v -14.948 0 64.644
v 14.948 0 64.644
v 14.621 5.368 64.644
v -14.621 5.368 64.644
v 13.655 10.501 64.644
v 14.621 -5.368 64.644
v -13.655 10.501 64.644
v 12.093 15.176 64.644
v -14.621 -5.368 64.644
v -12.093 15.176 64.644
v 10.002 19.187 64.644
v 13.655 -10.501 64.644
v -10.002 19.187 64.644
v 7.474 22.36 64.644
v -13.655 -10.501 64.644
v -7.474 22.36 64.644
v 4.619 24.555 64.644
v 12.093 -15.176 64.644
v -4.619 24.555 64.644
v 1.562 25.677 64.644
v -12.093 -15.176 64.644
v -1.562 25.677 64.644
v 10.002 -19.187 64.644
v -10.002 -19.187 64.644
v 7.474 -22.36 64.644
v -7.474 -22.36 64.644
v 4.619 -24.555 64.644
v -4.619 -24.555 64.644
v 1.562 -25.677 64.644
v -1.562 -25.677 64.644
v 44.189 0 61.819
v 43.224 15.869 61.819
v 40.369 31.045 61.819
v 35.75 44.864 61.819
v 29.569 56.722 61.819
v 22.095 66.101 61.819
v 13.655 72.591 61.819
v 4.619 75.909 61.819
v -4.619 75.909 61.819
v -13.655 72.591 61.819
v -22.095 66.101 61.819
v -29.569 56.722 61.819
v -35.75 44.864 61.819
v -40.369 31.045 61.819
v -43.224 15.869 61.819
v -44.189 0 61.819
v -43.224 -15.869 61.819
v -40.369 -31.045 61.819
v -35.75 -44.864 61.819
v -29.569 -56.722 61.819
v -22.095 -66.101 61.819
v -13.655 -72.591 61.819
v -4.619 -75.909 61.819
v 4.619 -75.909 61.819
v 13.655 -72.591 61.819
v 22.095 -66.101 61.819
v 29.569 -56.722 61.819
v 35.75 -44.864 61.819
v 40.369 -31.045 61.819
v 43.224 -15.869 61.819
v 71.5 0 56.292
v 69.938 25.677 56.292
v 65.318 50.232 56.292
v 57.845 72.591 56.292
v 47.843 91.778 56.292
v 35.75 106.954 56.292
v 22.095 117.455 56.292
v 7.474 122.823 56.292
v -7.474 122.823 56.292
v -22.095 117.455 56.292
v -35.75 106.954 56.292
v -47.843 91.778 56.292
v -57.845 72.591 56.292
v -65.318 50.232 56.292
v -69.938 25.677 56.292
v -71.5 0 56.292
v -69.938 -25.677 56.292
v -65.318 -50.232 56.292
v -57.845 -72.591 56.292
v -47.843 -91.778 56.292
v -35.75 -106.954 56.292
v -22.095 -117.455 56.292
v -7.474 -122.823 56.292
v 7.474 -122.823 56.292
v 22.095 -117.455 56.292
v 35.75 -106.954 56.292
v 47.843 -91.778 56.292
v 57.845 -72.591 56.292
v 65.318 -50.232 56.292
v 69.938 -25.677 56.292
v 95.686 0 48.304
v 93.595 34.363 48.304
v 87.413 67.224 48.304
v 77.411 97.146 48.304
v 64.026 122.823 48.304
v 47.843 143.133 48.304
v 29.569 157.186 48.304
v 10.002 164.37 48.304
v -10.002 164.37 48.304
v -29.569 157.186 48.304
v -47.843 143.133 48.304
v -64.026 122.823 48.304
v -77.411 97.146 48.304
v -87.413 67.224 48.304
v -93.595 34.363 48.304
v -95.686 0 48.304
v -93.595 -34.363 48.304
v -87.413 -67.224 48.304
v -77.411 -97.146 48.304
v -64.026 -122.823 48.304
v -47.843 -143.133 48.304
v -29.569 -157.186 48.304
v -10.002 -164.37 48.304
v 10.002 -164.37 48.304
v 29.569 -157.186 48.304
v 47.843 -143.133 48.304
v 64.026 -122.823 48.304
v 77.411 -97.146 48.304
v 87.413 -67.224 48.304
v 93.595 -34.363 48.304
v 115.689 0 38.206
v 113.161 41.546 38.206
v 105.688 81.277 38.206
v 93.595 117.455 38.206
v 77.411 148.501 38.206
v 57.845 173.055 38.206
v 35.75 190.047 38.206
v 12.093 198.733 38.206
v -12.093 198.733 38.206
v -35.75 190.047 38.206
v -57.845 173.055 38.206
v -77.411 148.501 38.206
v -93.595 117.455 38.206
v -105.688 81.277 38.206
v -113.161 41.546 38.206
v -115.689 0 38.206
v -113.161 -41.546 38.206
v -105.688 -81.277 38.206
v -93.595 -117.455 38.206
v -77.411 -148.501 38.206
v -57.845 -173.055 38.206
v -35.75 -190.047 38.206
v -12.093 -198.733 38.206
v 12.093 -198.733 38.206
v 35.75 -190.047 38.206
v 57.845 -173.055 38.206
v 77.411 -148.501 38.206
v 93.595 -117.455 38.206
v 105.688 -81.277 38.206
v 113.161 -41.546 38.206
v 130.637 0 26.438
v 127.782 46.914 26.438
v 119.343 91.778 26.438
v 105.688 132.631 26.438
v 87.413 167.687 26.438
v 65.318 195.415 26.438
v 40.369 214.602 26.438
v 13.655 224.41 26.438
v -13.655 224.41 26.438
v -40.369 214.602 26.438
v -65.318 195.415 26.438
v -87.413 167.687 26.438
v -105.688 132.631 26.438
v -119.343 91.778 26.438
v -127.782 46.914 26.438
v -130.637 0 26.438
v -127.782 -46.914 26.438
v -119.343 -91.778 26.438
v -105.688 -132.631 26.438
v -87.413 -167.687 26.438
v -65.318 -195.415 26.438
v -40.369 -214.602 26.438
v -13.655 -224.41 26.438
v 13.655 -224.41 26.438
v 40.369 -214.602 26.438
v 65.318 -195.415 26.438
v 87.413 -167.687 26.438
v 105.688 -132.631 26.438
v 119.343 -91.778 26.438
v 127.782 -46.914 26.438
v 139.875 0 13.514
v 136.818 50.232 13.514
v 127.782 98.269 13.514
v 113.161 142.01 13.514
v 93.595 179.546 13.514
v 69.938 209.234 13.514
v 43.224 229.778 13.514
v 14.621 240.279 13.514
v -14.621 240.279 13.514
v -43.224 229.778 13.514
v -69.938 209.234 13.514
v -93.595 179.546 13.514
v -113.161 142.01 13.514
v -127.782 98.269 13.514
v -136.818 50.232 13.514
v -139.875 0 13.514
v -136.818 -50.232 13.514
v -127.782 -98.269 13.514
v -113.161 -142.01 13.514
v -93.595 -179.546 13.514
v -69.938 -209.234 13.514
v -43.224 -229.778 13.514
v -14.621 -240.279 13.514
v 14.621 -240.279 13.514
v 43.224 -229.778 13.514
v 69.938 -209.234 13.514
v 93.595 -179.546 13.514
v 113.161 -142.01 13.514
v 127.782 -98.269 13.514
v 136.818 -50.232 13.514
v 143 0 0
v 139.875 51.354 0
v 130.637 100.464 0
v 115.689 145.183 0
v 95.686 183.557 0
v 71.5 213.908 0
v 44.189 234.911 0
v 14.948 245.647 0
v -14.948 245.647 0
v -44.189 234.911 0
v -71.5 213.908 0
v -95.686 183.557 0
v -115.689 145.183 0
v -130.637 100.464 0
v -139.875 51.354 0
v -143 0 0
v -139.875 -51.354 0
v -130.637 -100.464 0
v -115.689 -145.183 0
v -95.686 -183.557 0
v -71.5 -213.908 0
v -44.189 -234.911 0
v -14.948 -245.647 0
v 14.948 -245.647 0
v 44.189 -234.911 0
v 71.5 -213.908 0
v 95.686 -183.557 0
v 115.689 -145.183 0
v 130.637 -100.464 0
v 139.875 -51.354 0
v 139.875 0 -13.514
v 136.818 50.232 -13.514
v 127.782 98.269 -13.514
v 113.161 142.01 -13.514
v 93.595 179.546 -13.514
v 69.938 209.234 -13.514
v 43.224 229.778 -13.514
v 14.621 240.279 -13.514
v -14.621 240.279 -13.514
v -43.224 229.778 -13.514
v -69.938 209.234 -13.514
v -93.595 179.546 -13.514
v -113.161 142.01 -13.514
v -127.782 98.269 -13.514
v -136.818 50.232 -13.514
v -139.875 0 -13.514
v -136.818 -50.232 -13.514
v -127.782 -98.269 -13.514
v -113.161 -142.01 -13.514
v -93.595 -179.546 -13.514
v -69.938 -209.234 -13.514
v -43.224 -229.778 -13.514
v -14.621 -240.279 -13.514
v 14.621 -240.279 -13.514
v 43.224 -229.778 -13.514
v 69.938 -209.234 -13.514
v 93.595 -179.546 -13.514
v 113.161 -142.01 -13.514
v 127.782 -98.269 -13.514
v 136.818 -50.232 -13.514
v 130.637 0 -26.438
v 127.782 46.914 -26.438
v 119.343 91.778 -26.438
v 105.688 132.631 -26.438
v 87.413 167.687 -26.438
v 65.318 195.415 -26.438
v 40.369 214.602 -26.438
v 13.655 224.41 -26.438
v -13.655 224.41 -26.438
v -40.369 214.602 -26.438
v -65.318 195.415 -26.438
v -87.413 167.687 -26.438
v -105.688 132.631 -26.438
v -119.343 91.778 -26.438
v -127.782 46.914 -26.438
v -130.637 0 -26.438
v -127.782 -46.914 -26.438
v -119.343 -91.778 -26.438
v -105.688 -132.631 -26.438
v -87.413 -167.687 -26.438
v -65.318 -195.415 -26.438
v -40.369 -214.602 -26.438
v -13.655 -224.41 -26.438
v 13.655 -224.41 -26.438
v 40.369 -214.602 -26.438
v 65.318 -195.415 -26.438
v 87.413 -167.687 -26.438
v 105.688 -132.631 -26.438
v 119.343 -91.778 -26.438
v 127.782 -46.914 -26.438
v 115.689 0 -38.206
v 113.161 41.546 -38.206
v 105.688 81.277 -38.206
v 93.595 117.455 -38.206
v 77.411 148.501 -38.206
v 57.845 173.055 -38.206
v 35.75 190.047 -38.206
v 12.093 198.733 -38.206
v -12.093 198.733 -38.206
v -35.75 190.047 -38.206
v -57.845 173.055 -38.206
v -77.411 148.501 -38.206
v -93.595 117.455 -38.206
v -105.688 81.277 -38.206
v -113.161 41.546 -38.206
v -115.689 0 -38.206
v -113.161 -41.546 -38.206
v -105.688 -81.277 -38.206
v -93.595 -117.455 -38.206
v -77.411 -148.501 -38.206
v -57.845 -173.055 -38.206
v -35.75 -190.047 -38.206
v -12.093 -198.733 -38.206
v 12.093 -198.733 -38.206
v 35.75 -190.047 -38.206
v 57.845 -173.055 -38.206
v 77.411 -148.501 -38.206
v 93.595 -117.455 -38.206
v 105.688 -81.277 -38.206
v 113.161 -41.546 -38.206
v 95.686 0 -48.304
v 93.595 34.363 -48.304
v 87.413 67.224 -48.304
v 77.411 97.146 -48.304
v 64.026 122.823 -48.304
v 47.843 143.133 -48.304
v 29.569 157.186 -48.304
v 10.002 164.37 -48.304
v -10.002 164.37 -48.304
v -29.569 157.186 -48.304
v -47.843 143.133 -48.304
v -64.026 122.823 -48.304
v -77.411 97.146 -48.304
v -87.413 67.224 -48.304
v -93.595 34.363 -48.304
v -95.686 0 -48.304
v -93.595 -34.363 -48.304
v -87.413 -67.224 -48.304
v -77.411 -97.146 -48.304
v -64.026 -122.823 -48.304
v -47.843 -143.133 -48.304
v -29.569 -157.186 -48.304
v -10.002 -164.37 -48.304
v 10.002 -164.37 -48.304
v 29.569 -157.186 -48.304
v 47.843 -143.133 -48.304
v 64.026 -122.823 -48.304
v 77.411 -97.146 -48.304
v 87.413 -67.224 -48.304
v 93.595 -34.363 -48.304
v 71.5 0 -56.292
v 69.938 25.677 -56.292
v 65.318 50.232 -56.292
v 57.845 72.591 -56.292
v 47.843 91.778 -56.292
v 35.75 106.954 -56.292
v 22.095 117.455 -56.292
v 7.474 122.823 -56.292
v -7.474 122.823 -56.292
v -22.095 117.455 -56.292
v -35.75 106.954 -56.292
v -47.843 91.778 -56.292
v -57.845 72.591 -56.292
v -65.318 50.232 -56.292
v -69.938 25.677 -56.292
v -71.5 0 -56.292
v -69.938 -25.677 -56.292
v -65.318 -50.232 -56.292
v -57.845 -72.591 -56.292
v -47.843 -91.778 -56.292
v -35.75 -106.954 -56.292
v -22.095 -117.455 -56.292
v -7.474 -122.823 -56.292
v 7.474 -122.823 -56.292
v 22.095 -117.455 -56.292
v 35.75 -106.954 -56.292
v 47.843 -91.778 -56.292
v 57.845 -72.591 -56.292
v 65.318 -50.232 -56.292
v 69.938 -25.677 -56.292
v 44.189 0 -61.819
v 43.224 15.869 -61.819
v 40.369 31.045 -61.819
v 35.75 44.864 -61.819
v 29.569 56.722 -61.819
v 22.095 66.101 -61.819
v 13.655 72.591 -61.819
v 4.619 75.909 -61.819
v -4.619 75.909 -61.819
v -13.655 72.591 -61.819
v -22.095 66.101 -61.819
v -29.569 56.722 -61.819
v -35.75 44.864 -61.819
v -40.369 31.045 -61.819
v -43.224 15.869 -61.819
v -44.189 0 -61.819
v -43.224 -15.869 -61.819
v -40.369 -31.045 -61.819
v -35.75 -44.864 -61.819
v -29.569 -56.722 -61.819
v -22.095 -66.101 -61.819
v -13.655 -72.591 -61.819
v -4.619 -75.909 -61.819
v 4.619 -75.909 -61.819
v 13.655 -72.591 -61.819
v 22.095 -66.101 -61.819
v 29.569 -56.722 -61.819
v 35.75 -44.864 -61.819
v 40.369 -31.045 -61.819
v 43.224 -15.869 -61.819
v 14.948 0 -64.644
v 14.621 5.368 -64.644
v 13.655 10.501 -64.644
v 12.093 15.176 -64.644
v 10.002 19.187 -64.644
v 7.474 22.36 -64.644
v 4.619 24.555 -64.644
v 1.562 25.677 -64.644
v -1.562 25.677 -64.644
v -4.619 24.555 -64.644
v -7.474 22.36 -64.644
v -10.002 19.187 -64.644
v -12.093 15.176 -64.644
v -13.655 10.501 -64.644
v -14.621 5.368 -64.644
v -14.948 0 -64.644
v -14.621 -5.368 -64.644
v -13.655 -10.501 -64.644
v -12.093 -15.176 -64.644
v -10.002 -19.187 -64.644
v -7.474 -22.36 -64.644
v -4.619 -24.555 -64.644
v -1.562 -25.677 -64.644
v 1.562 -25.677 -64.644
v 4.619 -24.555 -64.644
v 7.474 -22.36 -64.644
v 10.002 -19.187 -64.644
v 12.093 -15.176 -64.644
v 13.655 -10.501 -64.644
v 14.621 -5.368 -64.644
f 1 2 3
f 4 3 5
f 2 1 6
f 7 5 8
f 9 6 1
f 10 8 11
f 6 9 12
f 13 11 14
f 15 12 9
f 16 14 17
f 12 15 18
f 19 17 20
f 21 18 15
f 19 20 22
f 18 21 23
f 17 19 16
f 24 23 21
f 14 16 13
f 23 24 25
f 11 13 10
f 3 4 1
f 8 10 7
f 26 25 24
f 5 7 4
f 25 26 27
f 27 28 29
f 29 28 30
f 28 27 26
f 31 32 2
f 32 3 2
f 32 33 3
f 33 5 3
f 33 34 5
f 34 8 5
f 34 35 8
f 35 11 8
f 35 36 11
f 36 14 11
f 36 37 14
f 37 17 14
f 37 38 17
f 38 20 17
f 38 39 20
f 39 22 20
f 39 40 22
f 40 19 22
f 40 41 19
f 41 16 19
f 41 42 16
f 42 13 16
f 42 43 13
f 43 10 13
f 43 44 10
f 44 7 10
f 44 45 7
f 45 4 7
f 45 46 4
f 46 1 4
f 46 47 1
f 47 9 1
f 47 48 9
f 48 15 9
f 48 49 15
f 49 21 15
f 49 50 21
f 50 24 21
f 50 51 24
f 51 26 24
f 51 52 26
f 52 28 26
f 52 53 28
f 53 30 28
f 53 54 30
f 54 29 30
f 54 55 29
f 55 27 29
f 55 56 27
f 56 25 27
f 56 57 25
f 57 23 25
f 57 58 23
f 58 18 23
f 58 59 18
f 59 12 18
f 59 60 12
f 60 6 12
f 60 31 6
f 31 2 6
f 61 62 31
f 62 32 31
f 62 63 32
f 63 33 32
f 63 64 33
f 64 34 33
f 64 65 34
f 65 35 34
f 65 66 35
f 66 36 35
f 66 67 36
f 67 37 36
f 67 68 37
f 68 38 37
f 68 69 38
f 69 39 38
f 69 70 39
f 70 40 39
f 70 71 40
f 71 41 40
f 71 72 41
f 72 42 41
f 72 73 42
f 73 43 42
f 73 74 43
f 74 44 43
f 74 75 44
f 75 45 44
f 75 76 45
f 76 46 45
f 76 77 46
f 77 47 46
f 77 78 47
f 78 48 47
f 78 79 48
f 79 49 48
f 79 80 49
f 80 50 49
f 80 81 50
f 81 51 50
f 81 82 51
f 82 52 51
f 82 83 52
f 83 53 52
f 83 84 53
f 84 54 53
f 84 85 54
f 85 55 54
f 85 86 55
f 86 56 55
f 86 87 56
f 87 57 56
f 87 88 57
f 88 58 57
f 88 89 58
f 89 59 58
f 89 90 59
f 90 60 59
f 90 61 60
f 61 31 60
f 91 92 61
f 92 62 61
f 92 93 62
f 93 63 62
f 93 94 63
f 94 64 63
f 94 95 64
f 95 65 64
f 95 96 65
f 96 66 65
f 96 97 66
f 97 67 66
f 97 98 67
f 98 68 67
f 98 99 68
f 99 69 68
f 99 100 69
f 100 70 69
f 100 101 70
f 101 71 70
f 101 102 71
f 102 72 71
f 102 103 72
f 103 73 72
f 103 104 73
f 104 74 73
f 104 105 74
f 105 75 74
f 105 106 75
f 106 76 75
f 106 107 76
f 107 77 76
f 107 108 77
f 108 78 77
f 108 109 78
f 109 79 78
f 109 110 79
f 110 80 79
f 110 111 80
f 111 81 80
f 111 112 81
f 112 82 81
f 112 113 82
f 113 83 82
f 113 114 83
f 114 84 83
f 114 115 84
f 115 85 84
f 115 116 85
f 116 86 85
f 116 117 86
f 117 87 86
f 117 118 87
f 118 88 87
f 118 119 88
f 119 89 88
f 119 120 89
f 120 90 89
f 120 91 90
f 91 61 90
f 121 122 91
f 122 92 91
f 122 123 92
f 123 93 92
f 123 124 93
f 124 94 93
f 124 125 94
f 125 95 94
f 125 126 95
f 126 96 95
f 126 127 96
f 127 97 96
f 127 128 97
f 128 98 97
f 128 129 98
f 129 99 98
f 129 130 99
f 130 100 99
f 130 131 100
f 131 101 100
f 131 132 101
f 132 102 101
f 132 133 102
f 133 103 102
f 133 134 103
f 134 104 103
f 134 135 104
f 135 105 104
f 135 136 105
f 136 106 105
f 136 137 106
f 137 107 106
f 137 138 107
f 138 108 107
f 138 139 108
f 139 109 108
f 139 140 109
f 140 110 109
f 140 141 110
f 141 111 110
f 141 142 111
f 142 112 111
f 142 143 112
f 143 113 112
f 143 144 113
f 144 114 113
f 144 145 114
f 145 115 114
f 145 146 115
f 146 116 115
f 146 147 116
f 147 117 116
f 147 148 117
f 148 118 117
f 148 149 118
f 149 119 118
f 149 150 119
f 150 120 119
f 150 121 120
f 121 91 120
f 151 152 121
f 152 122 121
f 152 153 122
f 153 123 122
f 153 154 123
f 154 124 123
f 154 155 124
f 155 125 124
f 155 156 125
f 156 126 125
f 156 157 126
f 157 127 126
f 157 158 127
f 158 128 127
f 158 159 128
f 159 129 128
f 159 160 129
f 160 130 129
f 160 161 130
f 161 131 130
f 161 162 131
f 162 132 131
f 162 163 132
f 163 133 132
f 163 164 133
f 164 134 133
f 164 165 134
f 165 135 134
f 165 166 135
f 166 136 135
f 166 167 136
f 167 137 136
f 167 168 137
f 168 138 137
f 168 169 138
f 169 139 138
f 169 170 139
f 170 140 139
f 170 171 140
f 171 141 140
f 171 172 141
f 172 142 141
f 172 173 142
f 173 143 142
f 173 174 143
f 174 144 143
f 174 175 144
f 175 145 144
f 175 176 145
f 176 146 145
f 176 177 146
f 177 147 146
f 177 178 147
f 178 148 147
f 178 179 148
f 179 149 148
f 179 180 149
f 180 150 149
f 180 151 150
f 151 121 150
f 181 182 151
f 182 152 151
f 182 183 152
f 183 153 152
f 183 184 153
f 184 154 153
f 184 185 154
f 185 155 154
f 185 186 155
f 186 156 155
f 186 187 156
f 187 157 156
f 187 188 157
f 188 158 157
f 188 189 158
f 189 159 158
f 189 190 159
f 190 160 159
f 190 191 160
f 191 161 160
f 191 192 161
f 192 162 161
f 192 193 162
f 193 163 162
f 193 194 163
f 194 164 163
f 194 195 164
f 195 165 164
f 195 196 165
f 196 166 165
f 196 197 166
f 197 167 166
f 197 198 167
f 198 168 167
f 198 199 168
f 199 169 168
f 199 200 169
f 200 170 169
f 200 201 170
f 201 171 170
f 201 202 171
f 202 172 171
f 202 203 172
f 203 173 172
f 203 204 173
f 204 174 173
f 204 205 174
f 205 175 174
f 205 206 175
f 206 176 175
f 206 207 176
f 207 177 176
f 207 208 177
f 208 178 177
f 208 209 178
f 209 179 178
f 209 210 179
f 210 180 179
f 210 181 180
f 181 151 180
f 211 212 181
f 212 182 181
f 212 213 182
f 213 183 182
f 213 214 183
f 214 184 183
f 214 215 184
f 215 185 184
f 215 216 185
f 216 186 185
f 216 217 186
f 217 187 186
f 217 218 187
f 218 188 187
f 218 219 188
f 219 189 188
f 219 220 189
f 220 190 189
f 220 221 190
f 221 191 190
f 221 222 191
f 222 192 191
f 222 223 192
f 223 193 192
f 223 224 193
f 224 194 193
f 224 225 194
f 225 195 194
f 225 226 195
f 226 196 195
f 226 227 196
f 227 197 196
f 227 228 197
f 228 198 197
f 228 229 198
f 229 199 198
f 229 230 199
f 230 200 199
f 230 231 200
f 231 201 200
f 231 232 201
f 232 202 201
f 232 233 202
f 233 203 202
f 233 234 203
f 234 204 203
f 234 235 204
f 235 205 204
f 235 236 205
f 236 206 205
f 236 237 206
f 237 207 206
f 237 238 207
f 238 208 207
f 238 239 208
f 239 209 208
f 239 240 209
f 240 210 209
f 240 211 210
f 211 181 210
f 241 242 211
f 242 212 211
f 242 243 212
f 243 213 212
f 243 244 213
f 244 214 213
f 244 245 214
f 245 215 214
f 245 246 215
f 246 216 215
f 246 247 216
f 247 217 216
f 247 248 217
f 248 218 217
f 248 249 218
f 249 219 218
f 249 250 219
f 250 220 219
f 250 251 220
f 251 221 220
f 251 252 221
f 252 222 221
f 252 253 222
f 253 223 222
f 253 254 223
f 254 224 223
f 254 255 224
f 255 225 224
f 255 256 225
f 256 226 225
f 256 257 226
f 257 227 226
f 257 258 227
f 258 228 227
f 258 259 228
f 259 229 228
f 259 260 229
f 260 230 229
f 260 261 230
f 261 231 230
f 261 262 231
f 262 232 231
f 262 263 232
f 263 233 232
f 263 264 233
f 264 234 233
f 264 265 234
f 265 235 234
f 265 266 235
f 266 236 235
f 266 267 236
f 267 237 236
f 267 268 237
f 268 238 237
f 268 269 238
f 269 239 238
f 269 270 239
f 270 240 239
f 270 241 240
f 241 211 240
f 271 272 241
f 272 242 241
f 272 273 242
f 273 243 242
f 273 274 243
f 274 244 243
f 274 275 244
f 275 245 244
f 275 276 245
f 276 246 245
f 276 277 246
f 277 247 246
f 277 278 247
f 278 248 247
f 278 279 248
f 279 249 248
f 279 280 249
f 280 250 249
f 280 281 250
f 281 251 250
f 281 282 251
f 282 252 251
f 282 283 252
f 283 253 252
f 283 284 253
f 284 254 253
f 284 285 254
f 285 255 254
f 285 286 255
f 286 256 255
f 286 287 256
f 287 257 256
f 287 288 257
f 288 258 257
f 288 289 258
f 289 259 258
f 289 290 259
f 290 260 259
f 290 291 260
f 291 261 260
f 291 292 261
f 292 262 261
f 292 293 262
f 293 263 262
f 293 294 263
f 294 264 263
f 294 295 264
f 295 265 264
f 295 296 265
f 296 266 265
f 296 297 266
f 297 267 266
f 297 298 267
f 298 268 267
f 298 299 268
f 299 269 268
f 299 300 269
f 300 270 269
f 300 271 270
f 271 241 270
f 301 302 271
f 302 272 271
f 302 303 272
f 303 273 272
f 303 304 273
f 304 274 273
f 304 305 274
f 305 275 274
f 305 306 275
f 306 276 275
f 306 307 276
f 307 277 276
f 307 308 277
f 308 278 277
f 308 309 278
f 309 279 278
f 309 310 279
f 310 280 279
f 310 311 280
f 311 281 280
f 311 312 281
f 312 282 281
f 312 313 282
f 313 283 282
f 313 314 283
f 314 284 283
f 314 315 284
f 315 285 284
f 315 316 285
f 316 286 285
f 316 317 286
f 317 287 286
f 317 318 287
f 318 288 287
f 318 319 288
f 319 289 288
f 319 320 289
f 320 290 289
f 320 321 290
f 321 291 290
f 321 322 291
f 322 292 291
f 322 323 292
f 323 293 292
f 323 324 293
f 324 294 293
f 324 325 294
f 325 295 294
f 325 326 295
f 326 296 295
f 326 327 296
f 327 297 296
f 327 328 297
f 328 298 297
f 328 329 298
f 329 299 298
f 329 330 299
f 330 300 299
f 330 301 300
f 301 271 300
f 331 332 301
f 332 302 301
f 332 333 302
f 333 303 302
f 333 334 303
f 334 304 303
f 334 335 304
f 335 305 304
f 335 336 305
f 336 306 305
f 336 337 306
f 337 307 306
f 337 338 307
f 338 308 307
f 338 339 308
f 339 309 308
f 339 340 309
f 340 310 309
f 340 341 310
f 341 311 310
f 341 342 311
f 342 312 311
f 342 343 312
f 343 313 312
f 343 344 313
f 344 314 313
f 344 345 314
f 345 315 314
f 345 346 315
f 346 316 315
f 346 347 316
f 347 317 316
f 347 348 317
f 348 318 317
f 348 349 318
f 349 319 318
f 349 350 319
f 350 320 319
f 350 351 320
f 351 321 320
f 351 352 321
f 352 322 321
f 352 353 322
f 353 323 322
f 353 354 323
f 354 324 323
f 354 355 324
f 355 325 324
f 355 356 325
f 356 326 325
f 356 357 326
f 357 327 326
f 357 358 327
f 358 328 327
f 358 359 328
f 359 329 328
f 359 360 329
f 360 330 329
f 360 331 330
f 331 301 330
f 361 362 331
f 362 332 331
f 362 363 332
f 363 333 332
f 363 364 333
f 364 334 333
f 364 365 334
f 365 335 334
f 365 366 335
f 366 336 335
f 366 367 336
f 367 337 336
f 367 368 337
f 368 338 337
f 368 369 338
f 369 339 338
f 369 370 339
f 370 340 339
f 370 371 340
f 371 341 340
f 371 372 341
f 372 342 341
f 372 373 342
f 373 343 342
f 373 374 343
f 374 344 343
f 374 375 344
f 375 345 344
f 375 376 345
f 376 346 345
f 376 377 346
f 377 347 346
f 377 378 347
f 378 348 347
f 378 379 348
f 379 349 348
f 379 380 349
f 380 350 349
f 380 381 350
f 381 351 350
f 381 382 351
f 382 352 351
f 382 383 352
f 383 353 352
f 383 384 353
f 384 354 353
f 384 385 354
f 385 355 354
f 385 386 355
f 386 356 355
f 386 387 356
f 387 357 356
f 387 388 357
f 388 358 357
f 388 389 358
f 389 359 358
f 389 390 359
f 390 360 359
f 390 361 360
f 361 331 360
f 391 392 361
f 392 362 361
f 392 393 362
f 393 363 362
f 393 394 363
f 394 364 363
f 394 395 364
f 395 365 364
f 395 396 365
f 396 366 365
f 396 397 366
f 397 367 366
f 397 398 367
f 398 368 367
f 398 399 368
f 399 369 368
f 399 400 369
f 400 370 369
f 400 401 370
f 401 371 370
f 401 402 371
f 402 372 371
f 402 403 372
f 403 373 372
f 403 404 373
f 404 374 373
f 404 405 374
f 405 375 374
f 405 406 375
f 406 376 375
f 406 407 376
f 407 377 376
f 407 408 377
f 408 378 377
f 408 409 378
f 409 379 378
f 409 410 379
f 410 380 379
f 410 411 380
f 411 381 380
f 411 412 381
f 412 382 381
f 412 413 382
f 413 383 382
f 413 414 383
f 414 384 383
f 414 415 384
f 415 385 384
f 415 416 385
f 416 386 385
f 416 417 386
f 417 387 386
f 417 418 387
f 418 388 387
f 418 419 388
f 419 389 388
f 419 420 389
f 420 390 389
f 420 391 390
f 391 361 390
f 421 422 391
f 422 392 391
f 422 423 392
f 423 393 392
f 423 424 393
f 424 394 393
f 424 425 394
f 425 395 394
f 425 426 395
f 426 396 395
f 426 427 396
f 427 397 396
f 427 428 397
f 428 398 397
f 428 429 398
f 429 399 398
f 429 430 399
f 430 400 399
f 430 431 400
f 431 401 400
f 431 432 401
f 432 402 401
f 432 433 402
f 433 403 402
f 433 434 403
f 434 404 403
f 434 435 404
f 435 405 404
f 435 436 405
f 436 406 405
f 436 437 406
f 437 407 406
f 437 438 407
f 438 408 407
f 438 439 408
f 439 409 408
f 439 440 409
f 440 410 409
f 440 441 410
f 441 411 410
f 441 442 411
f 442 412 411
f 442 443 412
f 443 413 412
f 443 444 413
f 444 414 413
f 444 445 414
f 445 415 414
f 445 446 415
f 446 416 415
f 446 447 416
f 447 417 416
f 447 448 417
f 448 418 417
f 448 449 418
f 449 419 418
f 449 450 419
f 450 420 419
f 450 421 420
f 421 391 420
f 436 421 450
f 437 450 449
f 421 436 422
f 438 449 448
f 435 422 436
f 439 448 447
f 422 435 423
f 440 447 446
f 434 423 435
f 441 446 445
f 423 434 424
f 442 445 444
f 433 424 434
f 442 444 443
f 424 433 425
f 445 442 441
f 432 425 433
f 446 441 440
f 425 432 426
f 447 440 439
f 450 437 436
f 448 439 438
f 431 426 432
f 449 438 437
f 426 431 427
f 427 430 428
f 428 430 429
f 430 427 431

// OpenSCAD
// Generated by SolidPython 1.0.1 on 2020-07-29 00:46:50


scale(v = [11, 19, 5]) {
	sphere(r = 13);
}
/***********************************************
*********      SolidPython code:      **********
************************************************
 
# import packages: SolidPython
from solid import *
from solid.utils import *
from itertools import chain, combinations, permutations


class Resize:

    def __init__(self, scad_file):
        self.scad_file = scad_file
        #self.scad_file = import_scad(scad_file)
        # cone/cylinder param:
        self.r1 = 0
        self.r2 = 0
        self.h = 0
        # rectangular prism param:
        self.w = 0
        self.l = 0
        # ellipse param:
        self.r = 0

    # import OpenScad code (file name corresponds to shape)


    # classify shape + parameters
    def assign(self, param1, param2, param3):
        if self.scad_file == 'cone.scad':
            self.r1 = param1
            self.r2 = param2
            self.h = param3
        elif self.scad_file == 'cylinder.scad':
            self.r1 = param1
            self.r2 = param2
            self.h = param3
        elif self.scad_file == 'rectangularPrism.scad':
            self.h = param1
            self.l = param2
            self.w = param3
        else:
            self.r = param1
            self.h = param2

    # resize parameters
    def iterate(self):
        x = range(3, 20, 2)
        i = 1
        if self.scad_file == 'cone.scad':
            tempList = list(permutations(x, 2))
            for temp in tempList:
                param1 = temp[0]
                param2 = temp[1]
                filepath = 'produced_scad_files/' + 'cone' + str(param1) + '_' + str(param2) + '_' + '.scad'
                scad_render_to_file(cylinder(h=param1, r1=param2, r2=0), filepath)

        elif self.scad_file == 'cylinder.scad':
            tempList = list(permutations(x, 3))
            for temp in tempList:
                param1 = temp[0]
                param2 = temp[1]
                filepath = 'produced_scad_files/' + 'cylinder' + str(param1) + '_' + str(param2) + '_' + '.scad'
                scad_render_to_file(cylinder(h=param1, r1=param2, r2=param2), filepath)

        elif self.scad_file == 'rectangularPrism.scad':
            tempList = list(permutations(x, 3))
            for temp in tempList:
                param1 = temp[0]
                param2 = temp[1]
                param3 = temp[2]
                filepath = 'produced_scad_files/' + 'rectangularPrism' + str(param1) + '_' + str(param2) + '_' + str(
                    param3) + '.scad'
                scad_render_to_file(cube(size=(param1, param2, param3)), filepath)

        elif self.scad_file == 'ellipse.scad':
            tempList = list(permutations(x, 4))
            for temp in tempList:
                param1 = temp[0]
                param2 = temp[1]
                param3 = temp[2]
                param4 = temp[3]
                filepath = 'produced_scad_files/' + 'ellipse' + str(param1) + '_' + str(param2) + '_' + str(param3) + '_' + str(param4) + '.scad'
                scad_render_to_file(scale([param1, param2, param3])(sphere(r=param4)), filepath)

    def render_to_scadfile(self):
        scad_render_to_file(scad, 'example.scad') 
 
************************************************/
